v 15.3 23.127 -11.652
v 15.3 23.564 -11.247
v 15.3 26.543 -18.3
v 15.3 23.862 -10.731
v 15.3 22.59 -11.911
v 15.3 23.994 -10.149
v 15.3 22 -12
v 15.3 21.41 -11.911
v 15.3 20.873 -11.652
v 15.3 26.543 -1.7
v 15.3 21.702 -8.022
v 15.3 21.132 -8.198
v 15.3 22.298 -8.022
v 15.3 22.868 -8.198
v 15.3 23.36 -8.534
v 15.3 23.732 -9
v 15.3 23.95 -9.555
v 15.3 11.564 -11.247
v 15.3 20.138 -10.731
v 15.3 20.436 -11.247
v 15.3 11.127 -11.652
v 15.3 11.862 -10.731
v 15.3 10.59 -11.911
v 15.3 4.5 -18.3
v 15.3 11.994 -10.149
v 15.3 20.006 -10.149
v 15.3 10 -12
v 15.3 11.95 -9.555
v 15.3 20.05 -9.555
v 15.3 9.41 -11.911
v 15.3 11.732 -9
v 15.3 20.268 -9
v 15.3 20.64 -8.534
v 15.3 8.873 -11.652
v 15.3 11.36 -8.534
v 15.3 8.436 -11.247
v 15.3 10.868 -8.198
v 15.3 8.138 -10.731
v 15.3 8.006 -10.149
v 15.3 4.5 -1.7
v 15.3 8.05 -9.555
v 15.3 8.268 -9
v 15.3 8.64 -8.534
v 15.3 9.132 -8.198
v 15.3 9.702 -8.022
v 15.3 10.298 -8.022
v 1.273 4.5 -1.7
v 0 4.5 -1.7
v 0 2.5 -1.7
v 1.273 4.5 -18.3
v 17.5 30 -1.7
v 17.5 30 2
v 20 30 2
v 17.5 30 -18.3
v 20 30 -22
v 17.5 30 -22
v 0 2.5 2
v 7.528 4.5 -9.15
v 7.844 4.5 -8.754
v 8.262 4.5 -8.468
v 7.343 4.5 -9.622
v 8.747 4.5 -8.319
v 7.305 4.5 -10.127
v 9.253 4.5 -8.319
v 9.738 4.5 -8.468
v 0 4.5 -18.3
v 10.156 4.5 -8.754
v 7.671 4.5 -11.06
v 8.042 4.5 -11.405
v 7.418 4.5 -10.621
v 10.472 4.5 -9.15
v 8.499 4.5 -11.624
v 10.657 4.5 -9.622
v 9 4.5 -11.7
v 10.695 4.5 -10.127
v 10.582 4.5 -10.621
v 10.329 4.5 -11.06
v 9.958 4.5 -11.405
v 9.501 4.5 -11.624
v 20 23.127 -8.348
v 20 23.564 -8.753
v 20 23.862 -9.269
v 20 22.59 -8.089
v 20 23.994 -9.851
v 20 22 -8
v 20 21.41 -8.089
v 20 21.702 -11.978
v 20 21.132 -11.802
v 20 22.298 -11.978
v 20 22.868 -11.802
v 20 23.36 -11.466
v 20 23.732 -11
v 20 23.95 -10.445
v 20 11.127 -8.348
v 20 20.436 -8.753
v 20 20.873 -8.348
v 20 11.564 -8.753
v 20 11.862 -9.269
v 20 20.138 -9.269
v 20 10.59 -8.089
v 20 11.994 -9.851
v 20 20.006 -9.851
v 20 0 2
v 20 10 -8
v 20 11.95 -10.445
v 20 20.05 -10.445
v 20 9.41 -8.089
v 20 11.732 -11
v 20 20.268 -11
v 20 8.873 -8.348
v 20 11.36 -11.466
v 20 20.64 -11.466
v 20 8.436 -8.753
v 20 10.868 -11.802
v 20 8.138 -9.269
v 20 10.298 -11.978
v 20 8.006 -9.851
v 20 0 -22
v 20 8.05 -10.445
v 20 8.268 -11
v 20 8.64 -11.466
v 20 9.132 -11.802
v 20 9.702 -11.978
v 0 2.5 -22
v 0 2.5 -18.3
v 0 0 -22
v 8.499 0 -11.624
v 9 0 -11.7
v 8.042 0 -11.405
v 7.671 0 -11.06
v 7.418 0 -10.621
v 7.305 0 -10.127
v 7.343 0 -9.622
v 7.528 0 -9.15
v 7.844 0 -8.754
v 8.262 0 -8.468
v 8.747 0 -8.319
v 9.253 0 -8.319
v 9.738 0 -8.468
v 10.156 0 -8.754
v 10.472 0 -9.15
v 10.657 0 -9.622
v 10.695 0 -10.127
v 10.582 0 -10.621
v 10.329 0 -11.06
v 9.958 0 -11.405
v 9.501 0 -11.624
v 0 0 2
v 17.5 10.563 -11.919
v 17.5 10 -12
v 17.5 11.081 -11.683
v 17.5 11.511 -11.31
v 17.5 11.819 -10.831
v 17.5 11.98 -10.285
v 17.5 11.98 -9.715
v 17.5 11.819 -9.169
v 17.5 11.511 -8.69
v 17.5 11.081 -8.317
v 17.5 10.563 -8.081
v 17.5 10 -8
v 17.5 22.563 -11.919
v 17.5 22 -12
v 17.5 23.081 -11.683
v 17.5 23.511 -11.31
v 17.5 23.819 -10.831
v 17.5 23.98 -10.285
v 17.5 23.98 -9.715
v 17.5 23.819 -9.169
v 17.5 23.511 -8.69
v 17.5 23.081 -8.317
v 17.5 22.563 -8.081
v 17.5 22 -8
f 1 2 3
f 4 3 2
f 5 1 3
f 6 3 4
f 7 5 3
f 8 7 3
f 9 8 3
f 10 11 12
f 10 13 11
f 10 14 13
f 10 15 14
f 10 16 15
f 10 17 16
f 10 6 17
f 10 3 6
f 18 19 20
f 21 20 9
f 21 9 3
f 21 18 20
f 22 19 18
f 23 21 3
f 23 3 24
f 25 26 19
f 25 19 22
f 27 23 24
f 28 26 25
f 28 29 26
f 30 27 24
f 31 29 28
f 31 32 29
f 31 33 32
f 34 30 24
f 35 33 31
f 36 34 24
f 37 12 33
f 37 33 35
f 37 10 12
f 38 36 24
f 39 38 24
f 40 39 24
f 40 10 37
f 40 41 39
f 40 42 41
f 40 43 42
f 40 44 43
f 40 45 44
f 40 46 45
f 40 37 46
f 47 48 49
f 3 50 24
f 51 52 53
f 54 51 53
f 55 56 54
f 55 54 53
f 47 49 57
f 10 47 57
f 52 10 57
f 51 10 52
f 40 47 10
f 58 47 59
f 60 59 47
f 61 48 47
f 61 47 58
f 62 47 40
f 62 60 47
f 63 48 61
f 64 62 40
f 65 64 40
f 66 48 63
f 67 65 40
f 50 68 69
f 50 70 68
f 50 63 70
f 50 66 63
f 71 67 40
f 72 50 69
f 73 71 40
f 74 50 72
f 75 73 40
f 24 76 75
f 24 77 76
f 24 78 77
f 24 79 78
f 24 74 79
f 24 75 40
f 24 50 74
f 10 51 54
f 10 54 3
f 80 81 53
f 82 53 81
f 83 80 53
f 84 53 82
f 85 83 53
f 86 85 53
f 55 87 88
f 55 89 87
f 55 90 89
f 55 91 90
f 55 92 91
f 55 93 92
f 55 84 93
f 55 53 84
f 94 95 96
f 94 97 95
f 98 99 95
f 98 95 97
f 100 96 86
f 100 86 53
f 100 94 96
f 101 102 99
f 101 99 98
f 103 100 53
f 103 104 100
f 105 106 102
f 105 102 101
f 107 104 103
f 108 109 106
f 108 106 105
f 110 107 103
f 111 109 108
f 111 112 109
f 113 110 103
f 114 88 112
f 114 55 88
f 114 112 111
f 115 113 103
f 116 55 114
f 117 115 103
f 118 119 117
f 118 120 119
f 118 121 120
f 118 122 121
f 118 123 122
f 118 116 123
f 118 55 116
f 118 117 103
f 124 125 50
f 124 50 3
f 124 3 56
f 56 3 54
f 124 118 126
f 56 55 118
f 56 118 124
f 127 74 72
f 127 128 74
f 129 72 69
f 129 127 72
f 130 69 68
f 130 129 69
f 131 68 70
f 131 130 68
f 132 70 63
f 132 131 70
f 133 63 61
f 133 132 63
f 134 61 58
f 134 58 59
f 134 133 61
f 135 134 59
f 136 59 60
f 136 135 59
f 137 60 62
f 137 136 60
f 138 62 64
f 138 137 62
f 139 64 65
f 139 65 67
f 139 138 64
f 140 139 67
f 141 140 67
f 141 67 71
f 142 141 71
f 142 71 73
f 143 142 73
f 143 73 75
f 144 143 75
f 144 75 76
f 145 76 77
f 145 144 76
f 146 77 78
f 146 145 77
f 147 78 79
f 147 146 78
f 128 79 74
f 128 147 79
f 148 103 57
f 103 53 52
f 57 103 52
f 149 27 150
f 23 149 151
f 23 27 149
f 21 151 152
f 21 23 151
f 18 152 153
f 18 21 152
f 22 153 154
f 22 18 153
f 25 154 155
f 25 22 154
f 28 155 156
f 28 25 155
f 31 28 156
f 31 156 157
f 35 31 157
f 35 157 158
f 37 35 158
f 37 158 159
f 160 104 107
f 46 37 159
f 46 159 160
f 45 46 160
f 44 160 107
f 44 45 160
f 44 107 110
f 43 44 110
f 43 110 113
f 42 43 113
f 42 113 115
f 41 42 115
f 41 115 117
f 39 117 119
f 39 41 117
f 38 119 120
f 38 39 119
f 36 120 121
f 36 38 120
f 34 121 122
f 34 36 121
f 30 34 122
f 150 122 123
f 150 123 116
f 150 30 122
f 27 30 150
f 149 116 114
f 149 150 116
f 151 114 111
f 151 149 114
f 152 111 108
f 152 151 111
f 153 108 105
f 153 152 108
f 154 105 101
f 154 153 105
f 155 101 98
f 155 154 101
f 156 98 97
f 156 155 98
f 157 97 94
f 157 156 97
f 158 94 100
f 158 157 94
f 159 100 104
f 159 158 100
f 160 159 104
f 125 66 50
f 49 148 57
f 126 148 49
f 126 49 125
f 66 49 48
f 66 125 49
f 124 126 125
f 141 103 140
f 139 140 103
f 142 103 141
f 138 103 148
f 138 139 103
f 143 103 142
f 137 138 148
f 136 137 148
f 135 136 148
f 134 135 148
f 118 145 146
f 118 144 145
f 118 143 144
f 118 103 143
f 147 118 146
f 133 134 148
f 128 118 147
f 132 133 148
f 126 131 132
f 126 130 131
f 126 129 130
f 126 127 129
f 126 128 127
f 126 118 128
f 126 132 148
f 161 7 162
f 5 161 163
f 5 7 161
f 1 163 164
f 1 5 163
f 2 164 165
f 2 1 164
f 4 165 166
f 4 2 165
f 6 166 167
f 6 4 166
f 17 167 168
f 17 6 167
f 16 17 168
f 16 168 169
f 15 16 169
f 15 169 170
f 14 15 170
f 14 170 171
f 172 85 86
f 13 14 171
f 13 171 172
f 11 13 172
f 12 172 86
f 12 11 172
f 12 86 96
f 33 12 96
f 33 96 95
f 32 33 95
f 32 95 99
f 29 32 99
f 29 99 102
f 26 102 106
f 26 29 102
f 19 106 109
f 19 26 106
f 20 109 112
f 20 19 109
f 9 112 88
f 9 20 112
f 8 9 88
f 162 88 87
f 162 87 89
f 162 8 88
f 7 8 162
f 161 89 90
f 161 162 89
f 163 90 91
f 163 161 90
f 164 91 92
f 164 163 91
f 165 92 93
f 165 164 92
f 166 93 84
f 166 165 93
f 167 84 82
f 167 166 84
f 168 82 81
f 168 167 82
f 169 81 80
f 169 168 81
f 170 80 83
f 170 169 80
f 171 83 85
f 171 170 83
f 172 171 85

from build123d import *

# Parameters (mm, degrees)
EXTRUDE_1_DEPTH          = 20
CUT_EXTRUDE_START        = 30
SKETCH_2_W               = 17.5
SKETCH_2_H               = 16.6
CUT_EXTRUDE_1_DEPTH      = 27.5
CUT_EXTRUDE_START_2      = 17.5
SKETCH_3_R               = 2
CUT_EXTRUDE_2_DEPTH      = 2.5
EXTRUDE_3_REACH          = 42.434
CUT_EXTRUDE_4_DEPTH      = 42.231056256
CUT_EXTRUDE_4_DEPTH_BACK = 2
SKETCH_3_2_R             = 2
CUT_EXTRUDE_6_DEPTH      = 42.231056256
CUT_EXTRUDE_6_DEPTH_BACK = 9
SKETCH_4_R               = 1.7
SKETCH_7_W               = 15.3
SKETCH_7_H               = 16.6
SKETCH_7_R               = 1.7
EXTRUDE_4_DEPTH          = 2
EXTRUDE_5_DEPTH          = 2
EXTRUDE_START            = -20
EXTRUDE_6_DEPTH          = 2


with BuildPart() as part:
    # 草图1 → 凸台-拉伸1 (new body)
    with BuildSketch(Plane.XY):
        Polygon((0, 0), (20, 0), (20, 30), (17.5, 30), (0, 2.5), align=None)
    extrude(amount=-EXTRUDE_1_DEPTH)

    # 草图2 → 切除-拉伸1 (cut)
    with BuildSketch(Plane(origin=(0, 0, 0), x_dir=(1, 0, 0), z_dir=(0, 1, 0)).offset(CUT_EXTRUDE_START)):
        with Locations((8.75, 10)):
            Rectangle(SKETCH_2_W, SKETCH_2_H)
    extrude(amount=-CUT_EXTRUDE_1_DEPTH, mode=Mode.SUBTRACT)

    # 草图3 → 切除-拉伸2 (cut)
    with BuildSketch(Plane(origin=(0, 0, 0), x_dir=(0, 0, -1), z_dir=(1, 0, 0)).offset(CUT_EXTRUDE_START_2)):
        with Locations(Location((10, 22, 0), (0, 0, 180))):
            Circle(SKETCH_3_R)
        with Locations(Location((10, 10, 0), (0, 0, 180))):
            Circle(SKETCH_3_R)
    extrude(amount=CUT_EXTRUDE_2_DEPTH, mode=Mode.SUBTRACT)

    # 草图6 → 凸台-拉伸3 (add, up to next)
    with BuildSketch(Plane(origin=(0, 0, -1.7), x_dir=(-1, 0, 0), z_dir=(0, 0, -1)), mode=Mode.PRIVATE) as extrude_3_sk1:
        Polygon((-15.3, 26.542857143), (-15.3, 2.5), (-17.5, 2.5), (-17.5, 30), align=None)
    extrude_3_tool1 = extrude(extrude_3_sk1.sketch, amount=EXTRUDE_3_REACH, mode=Mode.PRIVATE) - part.part
    add(extrude_3_tool1.solids().sort_by_distance((16.424593, 15.405038, -1.7))[0])

    # 草图3<2> → 切除-拉伸4 (cut, two sides: drawn at the far end of the back side and taken through both)
    with BuildSketch(Plane(origin=(0, 0, 0), x_dir=(0, 0, -1), z_dir=(1, 0, 0)).offset(-CUT_EXTRUDE_4_DEPTH_BACK)):
        with Locations((10, 22)):
            Circle(SKETCH_3_2_R)
        with Locations((10, 10)):
            Circle(SKETCH_3_2_R)
    extrude(amount=CUT_EXTRUDE_4_DEPTH + CUT_EXTRUDE_4_DEPTH_BACK, mode=Mode.SUBTRACT)

    # 草图4 → 切除-拉伸6 (cut, two sides: drawn at the far end of the back side and taken through both)
    with BuildSketch(Plane(origin=(0, 0, 0), x_dir=(1, 0, 0), z_dir=(0, 1, 0)).offset(-CUT_EXTRUDE_6_DEPTH_BACK)):
        with Locations(Location((9, 10, 0), (0, 0, 90))):
            Circle(SKETCH_4_R)
    extrude(amount=CUT_EXTRUDE_6_DEPTH + CUT_EXTRUDE_6_DEPTH_BACK, mode=Mode.SUBTRACT)

    # 草图7 → 凸台-拉伸4 (add)
    with BuildSketch(Plane(origin=(0, 2.5, 0), x_dir=(1, 0, 0), z_dir=(0, 1, 0))):
        with Locations((7.65, 10)):
            Rectangle(SKETCH_7_W, SKETCH_7_H)
        with Locations(Location((9, 10, 0), (0, 0, 90))):
            Circle(SKETCH_7_R, mode=Mode.SUBTRACT)
    extrude(amount=EXTRUDE_4_DEPTH)

    # 草图8 → 凸台-拉伸5 (add)
    with BuildSketch(Plane(origin=(0, 0, -20), x_dir=(-1, 0, 0), z_dir=(0, 0, -1))):
        Polygon((0, 0), (0, 2.5), (-17.5, 30), (-20, 30), (-20, 0), align=None)
    extrude(amount=EXTRUDE_5_DEPTH)

    # 草图8<2> → 凸台-拉伸6 (add)
    with BuildSketch(Plane(origin=(0, 0, -20), x_dir=(-1, 0, 0), z_dir=(0, 0, -1)).offset(EXTRUDE_START)):
        Polygon((0, 0), (0, 2.5), (-17.5, 30), (-20, 30), (-20, 0), align=None)
    extrude(amount=-EXTRUDE_6_DEPTH)


solid = part.part
